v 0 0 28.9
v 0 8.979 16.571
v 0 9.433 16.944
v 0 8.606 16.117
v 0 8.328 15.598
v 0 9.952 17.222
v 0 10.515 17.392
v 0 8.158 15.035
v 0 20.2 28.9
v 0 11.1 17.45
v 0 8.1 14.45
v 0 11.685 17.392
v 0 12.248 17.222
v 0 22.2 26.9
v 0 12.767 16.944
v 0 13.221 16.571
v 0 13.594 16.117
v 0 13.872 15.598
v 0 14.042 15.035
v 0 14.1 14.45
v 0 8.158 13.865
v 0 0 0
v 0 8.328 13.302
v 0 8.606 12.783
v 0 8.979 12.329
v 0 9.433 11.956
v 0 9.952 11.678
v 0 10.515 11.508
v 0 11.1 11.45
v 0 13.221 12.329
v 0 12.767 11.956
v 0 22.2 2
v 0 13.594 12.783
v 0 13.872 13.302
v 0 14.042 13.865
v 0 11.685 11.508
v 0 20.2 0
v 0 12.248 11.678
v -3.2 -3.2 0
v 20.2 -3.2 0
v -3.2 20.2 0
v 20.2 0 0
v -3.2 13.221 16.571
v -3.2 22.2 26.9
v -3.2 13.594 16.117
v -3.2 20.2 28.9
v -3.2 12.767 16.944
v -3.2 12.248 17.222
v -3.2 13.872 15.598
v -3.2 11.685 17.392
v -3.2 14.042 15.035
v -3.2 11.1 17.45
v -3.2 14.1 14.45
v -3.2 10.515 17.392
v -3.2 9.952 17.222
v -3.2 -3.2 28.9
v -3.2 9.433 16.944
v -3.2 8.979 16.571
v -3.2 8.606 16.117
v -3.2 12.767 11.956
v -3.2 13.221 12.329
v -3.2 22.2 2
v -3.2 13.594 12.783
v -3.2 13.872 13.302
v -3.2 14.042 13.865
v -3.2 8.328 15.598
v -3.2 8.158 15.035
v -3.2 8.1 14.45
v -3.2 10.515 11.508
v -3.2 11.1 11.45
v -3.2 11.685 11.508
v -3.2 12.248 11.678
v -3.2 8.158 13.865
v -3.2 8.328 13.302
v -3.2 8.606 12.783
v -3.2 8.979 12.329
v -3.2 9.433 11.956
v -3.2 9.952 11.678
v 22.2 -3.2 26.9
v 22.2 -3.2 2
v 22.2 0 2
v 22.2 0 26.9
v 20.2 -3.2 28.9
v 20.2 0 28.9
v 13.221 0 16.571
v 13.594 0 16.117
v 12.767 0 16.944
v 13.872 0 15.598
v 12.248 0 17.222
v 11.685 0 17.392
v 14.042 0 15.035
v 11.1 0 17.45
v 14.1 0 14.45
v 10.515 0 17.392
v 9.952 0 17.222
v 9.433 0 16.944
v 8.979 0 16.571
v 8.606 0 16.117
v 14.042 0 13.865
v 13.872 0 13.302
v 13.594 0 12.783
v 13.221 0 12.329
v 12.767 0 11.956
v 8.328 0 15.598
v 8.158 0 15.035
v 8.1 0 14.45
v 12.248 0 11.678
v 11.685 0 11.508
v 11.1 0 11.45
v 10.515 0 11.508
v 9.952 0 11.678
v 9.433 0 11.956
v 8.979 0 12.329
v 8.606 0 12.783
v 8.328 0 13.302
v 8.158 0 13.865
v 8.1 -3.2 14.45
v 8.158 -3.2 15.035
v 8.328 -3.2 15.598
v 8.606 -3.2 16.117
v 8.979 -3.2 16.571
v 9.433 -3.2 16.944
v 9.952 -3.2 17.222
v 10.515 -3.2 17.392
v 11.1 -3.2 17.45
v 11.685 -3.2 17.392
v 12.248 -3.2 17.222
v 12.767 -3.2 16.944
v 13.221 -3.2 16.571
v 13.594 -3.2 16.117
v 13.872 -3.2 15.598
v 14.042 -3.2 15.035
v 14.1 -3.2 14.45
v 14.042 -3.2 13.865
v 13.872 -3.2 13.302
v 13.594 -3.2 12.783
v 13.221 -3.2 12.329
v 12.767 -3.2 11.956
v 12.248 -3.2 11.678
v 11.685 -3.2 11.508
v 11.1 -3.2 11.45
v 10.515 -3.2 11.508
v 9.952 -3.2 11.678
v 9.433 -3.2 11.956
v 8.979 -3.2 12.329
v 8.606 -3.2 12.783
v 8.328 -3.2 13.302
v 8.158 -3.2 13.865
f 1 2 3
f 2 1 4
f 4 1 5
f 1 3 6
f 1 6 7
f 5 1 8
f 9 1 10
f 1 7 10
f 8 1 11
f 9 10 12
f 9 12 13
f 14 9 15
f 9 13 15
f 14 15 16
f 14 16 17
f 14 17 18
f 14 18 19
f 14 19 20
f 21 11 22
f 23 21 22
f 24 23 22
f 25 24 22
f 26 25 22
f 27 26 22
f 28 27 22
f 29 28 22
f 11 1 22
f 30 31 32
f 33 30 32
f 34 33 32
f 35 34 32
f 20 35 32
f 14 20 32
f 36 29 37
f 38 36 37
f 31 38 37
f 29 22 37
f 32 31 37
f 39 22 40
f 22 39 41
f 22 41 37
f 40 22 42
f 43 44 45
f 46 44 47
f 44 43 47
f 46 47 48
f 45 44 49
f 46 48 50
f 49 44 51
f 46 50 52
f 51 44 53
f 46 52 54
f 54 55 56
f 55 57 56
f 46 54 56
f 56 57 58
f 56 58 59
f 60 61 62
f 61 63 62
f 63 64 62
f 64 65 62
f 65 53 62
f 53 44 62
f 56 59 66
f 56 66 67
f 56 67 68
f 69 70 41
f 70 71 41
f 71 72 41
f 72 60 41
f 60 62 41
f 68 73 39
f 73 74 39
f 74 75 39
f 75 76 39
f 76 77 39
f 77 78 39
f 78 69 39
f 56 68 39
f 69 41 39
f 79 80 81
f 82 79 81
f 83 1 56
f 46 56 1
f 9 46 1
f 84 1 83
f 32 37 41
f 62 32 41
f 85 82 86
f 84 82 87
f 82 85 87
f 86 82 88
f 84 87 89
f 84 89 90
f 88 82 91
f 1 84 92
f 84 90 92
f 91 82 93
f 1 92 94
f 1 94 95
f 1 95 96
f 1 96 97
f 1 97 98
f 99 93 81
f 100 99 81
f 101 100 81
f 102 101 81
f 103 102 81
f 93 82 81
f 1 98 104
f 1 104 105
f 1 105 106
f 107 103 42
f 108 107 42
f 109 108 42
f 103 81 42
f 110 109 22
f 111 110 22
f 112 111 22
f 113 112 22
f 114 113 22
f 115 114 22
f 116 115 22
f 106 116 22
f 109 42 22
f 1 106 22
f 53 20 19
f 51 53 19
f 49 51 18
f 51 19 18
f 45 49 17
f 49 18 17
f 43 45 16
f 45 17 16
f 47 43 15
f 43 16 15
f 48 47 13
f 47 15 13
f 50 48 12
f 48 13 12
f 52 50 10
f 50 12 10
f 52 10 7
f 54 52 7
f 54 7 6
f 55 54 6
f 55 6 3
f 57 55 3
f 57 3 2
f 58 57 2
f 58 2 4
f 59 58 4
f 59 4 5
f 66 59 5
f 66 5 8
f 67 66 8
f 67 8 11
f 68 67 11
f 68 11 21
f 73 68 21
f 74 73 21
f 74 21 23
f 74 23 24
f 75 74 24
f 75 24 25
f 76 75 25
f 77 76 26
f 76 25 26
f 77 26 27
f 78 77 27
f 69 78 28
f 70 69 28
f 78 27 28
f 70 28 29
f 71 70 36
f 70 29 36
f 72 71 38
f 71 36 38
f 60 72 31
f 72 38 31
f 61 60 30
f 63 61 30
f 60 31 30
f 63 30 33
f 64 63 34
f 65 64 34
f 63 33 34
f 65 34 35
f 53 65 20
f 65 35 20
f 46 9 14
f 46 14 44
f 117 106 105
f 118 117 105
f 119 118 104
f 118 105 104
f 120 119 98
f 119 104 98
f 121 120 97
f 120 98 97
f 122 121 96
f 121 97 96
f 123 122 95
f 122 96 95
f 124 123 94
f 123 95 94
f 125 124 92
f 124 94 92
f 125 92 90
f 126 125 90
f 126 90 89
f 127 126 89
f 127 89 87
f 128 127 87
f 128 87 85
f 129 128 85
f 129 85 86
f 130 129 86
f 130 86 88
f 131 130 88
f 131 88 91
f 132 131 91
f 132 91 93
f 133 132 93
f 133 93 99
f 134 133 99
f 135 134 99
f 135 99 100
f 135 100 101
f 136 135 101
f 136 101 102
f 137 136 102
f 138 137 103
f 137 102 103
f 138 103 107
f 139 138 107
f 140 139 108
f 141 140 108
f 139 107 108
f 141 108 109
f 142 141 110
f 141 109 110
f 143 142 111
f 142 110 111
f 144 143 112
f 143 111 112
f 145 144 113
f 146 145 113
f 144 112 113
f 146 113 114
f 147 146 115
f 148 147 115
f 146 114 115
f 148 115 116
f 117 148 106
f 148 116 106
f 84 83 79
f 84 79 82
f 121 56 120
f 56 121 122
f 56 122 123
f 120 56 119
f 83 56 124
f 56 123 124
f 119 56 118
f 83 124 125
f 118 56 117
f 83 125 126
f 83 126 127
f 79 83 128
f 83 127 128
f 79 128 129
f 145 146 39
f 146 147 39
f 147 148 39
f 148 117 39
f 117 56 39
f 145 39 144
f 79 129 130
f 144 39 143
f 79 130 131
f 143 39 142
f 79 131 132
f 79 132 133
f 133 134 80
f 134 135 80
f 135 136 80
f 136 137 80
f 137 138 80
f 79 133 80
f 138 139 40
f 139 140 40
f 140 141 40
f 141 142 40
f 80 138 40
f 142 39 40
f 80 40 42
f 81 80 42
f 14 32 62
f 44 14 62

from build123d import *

# Parameters (mm, degrees)
RESSALTO_EXTRUS_O1_DEPTH = 28.9
CHANFRO1_SIZE            = 2
ESBO_O2_R                = 3
CORTE_EXTRUS_O1_DEPTH    = 43.671887701
ESBO_O3_R                = 3
CORTE_EXTRUS_O2_DEPTH    = 43.671887701


with BuildPart() as part:
    # Esboço1 → Ressalto-extrusão1 (new body)
    with BuildSketch(Plane.XY):
        Polygon((0, 0), (0, 22.2), (-3.2, 22.2), (-3.2, -3.2), (22.2, -3.2), (22.2, 0), align=None)
    extrude(amount=RESSALTO_EXTRUS_O1_DEPTH)

    # Chanfro1
    chanfro1_edges = [part.edges().sort_by_distance(p)[0] for p in [
        (-1.6, 22.2, 28.9),
        (22.2, -1.6, 28.9),
        (22.2, -1.6, 0),
        (-1.6, 22.2, 0),
    ]]
    chamfer(chanfro1_edges, length=CHANFRO1_SIZE)

    # Esboço2 → Corte-extrusão1 (cut, through all)
    with BuildSketch(Plane(origin=(0, 0, 0), x_dir=(1, 0, 0), z_dir=(0, 1, 0))):
        with Locations(Location((11.1, -14.45, 0), (0, 0, 180))):
            Circle(ESBO_O2_R)
    extrude(amount=-CORTE_EXTRUS_O1_DEPTH, mode=Mode.SUBTRACT)

    # Esboço3 → Corte-extrusão2 (cut, through all)
    with BuildSketch(Plane(origin=(0, 0, 0), x_dir=(0, 0, -1), z_dir=(1, 0, 0))):
        with Locations(Location((-14.45, 11.1, 0), (0, 0, 90))):
            Circle(ESBO_O3_R)
    extrude(amount=-CORTE_EXTRUS_O2_DEPTH, mode=Mode.SUBTRACT)


solid = part.part
